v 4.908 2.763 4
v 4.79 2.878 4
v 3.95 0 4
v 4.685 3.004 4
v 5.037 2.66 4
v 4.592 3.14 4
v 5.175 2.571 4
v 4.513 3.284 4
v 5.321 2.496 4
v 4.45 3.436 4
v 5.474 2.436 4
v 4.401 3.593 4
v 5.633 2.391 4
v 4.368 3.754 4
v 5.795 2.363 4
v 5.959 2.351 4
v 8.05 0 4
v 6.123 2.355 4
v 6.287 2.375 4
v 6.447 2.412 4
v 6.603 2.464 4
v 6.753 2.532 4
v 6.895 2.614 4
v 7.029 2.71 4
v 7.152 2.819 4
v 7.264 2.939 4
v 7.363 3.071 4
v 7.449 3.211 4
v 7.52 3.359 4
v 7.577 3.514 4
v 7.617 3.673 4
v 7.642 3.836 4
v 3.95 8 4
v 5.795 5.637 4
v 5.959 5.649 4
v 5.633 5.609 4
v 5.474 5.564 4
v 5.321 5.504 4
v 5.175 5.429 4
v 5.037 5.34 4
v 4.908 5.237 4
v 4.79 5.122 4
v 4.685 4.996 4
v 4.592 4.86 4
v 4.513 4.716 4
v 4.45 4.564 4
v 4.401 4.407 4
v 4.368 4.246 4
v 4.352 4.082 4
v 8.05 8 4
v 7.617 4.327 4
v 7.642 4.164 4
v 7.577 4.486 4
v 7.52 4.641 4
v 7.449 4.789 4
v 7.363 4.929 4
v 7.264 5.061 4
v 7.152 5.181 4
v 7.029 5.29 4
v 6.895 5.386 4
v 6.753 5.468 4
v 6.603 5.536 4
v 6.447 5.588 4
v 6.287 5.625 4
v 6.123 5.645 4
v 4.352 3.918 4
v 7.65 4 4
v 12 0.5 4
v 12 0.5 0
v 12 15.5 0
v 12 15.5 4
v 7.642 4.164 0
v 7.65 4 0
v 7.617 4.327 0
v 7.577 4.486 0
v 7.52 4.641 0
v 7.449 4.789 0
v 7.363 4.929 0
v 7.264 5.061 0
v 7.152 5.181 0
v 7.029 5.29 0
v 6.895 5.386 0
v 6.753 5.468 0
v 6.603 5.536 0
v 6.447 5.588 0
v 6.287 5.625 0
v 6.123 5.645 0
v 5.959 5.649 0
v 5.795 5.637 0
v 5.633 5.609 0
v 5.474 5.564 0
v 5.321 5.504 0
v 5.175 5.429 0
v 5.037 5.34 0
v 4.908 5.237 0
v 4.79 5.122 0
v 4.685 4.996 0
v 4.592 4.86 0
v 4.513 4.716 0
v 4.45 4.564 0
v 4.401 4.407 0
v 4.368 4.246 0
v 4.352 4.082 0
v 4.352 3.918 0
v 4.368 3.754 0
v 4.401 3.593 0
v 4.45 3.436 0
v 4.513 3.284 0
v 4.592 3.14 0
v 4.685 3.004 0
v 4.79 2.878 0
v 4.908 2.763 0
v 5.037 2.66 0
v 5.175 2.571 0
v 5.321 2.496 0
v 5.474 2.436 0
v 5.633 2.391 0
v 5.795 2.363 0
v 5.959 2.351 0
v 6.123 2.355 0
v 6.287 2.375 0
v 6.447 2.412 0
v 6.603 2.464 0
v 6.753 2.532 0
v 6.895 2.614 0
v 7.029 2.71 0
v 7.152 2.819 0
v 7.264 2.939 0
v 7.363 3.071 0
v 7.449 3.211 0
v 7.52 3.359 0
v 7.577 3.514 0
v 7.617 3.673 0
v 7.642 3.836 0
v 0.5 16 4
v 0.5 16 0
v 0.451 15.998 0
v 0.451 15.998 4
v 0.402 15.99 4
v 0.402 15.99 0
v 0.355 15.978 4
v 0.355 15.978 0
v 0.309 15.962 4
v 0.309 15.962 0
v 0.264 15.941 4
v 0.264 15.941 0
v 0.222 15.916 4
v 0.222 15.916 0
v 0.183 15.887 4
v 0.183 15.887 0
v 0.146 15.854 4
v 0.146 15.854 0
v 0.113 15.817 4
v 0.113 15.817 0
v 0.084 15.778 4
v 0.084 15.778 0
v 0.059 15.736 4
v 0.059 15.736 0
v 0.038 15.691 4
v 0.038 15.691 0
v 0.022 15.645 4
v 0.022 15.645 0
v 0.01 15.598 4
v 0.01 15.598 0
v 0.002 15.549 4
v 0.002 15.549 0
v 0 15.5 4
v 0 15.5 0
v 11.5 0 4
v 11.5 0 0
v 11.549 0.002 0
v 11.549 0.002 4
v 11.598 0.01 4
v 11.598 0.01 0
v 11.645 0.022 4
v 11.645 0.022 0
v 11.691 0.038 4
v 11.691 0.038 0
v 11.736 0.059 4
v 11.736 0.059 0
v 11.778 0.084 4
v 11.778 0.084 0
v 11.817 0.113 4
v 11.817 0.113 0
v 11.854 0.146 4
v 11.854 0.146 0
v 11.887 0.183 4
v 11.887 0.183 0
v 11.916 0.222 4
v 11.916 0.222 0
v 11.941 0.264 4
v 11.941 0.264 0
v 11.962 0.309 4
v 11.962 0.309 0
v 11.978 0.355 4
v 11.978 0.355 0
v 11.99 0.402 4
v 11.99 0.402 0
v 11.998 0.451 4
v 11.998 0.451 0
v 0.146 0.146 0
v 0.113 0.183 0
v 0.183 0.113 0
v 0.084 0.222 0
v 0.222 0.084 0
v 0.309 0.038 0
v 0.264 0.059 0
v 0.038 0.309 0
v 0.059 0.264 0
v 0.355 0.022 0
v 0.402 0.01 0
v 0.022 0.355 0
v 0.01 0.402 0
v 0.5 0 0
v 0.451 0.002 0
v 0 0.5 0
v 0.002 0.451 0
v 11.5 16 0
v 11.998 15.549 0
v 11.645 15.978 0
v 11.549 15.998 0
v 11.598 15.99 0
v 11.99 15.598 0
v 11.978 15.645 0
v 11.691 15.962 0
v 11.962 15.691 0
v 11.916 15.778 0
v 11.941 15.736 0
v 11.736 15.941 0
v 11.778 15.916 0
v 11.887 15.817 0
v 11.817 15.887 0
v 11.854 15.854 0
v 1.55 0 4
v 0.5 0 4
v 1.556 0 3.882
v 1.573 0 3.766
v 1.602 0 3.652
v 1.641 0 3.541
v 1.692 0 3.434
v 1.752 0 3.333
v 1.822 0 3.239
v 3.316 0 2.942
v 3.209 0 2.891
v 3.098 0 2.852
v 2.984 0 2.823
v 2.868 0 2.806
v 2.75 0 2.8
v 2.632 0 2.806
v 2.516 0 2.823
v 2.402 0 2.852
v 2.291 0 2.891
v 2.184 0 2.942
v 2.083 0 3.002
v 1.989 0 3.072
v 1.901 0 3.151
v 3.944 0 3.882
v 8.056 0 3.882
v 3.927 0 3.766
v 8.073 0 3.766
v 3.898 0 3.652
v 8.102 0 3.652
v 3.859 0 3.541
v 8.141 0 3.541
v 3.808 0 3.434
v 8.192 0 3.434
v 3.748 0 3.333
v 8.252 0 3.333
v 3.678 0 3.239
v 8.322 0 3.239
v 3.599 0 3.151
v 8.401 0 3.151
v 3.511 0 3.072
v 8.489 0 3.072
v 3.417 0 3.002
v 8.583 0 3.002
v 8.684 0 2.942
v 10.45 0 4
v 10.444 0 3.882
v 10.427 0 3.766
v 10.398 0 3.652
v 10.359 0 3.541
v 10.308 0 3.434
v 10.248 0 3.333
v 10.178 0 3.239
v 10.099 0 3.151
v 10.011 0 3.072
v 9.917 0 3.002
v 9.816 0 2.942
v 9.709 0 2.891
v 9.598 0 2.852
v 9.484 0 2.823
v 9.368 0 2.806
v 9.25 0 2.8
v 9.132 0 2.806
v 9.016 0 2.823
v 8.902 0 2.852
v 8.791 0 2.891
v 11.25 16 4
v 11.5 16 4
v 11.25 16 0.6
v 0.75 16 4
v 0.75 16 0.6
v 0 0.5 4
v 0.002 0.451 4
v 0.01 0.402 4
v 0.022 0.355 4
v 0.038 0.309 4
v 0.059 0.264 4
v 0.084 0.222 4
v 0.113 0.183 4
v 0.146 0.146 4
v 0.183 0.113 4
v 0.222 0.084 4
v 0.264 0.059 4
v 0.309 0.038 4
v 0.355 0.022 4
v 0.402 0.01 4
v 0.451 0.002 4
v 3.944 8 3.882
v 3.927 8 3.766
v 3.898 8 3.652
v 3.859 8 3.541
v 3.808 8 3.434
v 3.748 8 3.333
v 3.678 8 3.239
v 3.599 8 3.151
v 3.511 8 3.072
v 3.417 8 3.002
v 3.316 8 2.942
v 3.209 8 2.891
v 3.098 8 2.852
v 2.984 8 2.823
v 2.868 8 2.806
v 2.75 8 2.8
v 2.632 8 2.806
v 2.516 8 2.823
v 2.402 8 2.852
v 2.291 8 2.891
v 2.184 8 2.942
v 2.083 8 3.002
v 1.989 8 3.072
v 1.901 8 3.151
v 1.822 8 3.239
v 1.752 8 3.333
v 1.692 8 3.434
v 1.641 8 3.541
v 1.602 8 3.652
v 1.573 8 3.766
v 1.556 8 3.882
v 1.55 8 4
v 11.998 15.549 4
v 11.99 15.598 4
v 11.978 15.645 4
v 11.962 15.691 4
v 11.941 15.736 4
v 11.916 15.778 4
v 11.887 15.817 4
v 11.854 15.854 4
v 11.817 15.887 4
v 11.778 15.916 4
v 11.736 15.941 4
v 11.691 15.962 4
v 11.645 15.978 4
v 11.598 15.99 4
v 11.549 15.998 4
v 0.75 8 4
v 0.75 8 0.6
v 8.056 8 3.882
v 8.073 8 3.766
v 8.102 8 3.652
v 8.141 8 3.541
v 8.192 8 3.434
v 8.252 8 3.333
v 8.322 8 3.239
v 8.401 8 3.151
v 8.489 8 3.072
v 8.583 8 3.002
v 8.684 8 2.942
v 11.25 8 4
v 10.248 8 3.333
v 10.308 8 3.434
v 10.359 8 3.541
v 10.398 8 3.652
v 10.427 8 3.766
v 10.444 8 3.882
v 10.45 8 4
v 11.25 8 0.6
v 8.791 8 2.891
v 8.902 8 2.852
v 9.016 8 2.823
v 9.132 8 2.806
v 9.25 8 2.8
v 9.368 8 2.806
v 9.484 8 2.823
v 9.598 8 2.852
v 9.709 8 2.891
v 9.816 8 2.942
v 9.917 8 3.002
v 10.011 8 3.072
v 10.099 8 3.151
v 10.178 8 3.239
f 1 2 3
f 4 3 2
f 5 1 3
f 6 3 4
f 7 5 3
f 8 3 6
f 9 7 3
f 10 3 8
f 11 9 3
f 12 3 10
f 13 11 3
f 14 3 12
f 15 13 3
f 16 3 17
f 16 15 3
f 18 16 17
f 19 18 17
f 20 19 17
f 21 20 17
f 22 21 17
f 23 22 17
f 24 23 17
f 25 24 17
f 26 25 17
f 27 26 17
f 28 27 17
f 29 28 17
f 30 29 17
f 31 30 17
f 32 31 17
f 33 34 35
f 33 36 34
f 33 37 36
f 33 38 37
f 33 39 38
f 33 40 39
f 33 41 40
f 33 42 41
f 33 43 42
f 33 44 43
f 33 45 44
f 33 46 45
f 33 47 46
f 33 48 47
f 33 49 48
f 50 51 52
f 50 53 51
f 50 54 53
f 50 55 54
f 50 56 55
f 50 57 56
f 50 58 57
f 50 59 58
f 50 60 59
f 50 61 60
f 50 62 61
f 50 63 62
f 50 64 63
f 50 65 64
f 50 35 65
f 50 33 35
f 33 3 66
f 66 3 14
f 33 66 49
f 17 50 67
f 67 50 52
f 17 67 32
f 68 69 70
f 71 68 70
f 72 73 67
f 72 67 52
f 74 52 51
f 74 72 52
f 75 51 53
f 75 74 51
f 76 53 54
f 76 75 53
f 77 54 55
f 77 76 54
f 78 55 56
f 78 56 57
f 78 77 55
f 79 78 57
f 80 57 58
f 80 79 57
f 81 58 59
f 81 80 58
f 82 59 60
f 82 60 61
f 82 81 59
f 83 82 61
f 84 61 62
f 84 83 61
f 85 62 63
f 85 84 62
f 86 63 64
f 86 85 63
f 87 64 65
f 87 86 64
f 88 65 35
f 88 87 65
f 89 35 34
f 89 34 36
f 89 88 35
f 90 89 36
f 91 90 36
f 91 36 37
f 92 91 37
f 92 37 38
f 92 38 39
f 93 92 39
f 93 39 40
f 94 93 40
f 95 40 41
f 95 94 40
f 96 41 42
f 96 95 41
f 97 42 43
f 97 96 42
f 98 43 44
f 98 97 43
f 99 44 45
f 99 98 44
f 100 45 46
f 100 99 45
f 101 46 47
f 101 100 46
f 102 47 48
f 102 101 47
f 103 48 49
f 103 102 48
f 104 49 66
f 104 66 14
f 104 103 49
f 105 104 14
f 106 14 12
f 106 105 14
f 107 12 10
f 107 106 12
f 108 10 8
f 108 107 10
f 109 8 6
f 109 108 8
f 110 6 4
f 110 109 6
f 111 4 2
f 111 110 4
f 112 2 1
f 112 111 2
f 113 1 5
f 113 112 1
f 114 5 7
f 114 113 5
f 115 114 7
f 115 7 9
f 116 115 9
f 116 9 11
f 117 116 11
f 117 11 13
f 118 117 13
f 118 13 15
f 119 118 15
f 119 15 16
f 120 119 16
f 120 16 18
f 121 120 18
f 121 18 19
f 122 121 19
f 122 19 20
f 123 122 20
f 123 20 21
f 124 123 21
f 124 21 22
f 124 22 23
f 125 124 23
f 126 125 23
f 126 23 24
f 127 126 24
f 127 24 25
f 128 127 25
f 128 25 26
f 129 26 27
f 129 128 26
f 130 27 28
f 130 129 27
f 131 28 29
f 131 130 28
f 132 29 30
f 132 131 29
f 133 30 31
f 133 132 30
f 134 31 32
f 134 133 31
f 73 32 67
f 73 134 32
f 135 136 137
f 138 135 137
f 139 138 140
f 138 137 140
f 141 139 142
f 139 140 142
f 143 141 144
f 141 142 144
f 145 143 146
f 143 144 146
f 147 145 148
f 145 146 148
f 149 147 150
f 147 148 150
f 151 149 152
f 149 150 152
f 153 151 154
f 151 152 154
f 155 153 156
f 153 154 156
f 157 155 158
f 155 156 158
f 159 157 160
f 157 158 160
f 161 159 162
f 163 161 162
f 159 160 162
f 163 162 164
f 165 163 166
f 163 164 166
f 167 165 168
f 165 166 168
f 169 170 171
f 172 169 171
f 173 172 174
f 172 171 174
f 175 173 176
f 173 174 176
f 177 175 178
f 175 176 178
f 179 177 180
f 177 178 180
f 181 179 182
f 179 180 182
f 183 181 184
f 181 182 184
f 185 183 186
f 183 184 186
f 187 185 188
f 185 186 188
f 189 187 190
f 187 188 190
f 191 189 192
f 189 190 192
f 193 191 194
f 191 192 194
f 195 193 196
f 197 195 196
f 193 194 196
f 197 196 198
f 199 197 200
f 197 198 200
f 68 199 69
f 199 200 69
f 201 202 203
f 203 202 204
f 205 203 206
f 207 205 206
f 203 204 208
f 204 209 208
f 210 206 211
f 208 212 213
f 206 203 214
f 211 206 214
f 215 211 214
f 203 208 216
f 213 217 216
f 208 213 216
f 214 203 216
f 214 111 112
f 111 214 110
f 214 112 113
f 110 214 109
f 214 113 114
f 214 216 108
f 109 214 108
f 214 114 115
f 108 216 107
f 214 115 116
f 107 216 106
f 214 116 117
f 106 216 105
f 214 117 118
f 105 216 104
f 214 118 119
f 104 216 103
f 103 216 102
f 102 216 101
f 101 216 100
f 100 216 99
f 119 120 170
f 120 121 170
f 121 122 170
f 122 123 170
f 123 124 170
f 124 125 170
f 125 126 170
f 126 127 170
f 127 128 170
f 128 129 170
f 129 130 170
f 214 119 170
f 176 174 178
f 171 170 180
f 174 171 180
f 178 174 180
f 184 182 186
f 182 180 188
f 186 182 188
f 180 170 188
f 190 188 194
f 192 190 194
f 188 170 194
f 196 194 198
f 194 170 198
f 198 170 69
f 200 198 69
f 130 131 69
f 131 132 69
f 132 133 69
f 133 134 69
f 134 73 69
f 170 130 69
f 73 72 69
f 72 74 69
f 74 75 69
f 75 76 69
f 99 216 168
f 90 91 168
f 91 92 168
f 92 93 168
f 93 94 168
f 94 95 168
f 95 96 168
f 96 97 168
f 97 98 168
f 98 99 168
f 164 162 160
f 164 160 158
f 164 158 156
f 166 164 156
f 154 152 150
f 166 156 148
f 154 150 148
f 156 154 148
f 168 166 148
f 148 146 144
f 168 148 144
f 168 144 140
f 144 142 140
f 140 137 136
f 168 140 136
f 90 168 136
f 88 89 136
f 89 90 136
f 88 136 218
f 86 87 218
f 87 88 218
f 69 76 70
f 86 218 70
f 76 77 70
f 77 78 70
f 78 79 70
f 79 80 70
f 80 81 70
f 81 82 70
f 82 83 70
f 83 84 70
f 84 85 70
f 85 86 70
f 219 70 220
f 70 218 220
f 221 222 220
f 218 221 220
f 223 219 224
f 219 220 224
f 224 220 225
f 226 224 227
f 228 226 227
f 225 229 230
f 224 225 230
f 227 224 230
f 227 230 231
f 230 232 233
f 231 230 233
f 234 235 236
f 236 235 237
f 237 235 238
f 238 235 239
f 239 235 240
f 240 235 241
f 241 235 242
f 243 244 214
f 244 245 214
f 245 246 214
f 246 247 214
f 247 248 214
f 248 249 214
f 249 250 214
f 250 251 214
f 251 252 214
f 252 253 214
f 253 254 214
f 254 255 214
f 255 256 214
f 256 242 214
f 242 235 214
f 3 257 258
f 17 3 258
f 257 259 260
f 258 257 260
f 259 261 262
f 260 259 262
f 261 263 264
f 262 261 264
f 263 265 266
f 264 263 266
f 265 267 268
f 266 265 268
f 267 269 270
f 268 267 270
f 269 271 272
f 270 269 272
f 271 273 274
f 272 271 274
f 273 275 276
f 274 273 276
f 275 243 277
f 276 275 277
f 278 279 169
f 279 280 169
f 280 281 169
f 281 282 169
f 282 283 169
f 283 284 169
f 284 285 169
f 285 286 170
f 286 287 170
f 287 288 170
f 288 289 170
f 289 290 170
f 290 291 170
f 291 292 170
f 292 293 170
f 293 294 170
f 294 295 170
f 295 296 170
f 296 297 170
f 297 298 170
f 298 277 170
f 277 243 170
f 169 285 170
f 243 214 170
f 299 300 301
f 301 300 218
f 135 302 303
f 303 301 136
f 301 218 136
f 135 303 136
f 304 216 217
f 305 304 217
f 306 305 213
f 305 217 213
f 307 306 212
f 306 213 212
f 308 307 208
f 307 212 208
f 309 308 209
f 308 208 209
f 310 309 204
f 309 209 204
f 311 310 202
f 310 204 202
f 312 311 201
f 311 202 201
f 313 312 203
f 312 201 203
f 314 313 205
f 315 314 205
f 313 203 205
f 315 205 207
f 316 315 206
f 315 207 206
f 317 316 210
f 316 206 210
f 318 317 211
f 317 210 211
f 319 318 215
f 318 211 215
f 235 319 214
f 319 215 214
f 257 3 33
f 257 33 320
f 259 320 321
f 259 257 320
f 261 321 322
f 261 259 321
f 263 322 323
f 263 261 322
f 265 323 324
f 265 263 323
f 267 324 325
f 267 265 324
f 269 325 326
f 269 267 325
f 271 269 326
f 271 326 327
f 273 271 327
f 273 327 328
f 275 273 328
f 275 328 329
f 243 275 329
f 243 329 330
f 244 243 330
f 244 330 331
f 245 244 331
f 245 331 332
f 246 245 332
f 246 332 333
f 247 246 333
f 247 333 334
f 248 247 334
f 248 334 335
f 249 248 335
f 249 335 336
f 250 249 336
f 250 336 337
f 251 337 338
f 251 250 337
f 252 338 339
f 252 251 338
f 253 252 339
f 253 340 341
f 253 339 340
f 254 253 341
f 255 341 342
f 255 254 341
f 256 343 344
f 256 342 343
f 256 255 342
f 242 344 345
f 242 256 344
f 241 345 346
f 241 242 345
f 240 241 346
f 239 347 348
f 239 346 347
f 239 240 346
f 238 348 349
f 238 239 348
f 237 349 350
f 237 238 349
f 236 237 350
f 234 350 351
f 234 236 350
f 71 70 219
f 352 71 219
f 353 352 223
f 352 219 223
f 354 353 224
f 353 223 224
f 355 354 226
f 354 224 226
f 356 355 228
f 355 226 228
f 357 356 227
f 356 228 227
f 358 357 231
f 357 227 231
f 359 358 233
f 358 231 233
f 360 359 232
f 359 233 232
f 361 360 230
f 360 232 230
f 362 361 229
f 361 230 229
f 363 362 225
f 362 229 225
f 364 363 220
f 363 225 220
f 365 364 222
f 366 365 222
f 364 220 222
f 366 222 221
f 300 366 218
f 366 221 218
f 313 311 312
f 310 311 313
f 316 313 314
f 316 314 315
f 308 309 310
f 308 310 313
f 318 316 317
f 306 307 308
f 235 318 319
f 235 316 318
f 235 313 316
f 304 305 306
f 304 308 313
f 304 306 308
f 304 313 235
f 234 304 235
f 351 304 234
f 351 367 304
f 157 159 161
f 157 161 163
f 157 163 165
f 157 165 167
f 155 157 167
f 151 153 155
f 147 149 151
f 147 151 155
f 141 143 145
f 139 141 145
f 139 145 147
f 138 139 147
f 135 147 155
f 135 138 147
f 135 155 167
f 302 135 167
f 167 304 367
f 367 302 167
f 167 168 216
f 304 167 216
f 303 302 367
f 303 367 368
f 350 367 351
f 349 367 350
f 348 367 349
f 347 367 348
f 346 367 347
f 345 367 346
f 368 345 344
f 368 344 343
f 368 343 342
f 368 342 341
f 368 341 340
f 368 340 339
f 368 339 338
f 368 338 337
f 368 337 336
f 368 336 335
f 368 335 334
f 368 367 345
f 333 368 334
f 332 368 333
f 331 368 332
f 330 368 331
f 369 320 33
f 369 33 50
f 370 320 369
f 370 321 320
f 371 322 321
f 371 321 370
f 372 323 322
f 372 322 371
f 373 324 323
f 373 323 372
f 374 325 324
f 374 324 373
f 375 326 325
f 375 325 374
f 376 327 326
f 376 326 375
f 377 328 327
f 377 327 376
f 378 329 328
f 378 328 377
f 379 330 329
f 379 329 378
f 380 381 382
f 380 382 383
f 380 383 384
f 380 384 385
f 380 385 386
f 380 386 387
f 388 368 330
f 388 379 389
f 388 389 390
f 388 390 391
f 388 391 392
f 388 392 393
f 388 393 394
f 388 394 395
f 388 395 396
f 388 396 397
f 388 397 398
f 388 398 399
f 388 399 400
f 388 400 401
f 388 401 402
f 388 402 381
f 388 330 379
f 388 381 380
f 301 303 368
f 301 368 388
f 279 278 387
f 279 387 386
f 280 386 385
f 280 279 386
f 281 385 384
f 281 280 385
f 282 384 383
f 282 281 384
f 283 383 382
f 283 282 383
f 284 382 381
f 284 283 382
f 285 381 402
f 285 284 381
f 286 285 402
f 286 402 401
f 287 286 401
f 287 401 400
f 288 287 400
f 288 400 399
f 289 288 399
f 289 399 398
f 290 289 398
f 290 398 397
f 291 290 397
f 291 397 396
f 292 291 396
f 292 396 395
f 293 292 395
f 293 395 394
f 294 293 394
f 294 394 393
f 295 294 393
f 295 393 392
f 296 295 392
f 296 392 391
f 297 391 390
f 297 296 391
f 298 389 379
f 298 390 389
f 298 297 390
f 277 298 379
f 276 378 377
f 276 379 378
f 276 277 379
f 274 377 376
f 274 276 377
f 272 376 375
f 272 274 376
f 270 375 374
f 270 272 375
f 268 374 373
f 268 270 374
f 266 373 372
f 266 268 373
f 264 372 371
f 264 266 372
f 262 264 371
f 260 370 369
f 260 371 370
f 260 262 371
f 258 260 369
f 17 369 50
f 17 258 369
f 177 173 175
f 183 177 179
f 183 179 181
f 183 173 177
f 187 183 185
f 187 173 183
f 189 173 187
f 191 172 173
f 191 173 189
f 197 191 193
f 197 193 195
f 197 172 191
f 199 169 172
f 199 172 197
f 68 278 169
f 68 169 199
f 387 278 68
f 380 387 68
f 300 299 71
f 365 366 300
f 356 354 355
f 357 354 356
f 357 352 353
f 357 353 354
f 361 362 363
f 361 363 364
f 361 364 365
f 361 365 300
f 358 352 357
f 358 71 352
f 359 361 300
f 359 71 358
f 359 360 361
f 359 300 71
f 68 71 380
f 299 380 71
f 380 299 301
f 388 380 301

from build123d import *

# Parameters (mm, degrees)
SKETCH1_R           = 1.65
BOSS_EXTRUDE1_DEPTH = 4
CUT_EXTRUDE1_DEPTH  = 16
SKETCH3_W           = 10.5
SKETCH3_H           = 3.4
CUT_EXTRUDE2_DEPTH  = 8


with BuildPart() as part:
    # Sketch1 → Boss-Extrude1 (new body)
    with BuildSketch(Plane.XY):
        with BuildLine():
            Line((0.5, 0), (11.5, 0))
            ThreePointArc((11.5, 0), (11.853553391, 0.146446609), (12, 0.5))
            Line((12, 0.5), (12, 15.5))
            ThreePointArc((12, 15.5), (11.853553391, 15.853553391), (11.5, 16))
            Line((11.5, 16), (0.5, 16))
            ThreePointArc((0.5, 16), (0.146446609, 15.853553391), (0, 15.5))
            Line((0, 15.5), (0, 0.5))
            ThreePointArc((0, 0.5), (0.146446609, 0.146446609), (0.5, 0))
        make_face()
        with Locations((6, 4)):
            Circle(SKETCH1_R, mode=Mode.SUBTRACT)
    extrude(amount=BOSS_EXTRUDE1_DEPTH)

    # Sketch2 → Cut-Extrude1 (cut)
    with BuildSketch(Plane.XZ):
        with BuildLine():
            Line((1.55, 4), (3.95, 4))
            ThreePointArc((3.95, 4), (2.75, 2.8), (1.55, 4))
        make_face()
        with BuildLine():
            Line((8.05, 4), (10.45, 4))
            ThreePointArc((10.45, 4), (9.25, 2.8), (8.05, 4))
        make_face()
    extrude(amount=-CUT_EXTRUDE1_DEPTH, mode=Mode.SUBTRACT)

    # Sketch3 → Cut-Extrude2 (cut)
    with BuildSketch(Plane(origin=(0, 16, 0), x_dir=(1, 0, 0), z_dir=(0, 1, 0))):
        with Locations((6, -2.3)):
            Rectangle(SKETCH3_W, SKETCH3_H)
    extrude(amount=-CUT_EXTRUDE2_DEPTH, mode=Mode.SUBTRACT)


solid = part.part
